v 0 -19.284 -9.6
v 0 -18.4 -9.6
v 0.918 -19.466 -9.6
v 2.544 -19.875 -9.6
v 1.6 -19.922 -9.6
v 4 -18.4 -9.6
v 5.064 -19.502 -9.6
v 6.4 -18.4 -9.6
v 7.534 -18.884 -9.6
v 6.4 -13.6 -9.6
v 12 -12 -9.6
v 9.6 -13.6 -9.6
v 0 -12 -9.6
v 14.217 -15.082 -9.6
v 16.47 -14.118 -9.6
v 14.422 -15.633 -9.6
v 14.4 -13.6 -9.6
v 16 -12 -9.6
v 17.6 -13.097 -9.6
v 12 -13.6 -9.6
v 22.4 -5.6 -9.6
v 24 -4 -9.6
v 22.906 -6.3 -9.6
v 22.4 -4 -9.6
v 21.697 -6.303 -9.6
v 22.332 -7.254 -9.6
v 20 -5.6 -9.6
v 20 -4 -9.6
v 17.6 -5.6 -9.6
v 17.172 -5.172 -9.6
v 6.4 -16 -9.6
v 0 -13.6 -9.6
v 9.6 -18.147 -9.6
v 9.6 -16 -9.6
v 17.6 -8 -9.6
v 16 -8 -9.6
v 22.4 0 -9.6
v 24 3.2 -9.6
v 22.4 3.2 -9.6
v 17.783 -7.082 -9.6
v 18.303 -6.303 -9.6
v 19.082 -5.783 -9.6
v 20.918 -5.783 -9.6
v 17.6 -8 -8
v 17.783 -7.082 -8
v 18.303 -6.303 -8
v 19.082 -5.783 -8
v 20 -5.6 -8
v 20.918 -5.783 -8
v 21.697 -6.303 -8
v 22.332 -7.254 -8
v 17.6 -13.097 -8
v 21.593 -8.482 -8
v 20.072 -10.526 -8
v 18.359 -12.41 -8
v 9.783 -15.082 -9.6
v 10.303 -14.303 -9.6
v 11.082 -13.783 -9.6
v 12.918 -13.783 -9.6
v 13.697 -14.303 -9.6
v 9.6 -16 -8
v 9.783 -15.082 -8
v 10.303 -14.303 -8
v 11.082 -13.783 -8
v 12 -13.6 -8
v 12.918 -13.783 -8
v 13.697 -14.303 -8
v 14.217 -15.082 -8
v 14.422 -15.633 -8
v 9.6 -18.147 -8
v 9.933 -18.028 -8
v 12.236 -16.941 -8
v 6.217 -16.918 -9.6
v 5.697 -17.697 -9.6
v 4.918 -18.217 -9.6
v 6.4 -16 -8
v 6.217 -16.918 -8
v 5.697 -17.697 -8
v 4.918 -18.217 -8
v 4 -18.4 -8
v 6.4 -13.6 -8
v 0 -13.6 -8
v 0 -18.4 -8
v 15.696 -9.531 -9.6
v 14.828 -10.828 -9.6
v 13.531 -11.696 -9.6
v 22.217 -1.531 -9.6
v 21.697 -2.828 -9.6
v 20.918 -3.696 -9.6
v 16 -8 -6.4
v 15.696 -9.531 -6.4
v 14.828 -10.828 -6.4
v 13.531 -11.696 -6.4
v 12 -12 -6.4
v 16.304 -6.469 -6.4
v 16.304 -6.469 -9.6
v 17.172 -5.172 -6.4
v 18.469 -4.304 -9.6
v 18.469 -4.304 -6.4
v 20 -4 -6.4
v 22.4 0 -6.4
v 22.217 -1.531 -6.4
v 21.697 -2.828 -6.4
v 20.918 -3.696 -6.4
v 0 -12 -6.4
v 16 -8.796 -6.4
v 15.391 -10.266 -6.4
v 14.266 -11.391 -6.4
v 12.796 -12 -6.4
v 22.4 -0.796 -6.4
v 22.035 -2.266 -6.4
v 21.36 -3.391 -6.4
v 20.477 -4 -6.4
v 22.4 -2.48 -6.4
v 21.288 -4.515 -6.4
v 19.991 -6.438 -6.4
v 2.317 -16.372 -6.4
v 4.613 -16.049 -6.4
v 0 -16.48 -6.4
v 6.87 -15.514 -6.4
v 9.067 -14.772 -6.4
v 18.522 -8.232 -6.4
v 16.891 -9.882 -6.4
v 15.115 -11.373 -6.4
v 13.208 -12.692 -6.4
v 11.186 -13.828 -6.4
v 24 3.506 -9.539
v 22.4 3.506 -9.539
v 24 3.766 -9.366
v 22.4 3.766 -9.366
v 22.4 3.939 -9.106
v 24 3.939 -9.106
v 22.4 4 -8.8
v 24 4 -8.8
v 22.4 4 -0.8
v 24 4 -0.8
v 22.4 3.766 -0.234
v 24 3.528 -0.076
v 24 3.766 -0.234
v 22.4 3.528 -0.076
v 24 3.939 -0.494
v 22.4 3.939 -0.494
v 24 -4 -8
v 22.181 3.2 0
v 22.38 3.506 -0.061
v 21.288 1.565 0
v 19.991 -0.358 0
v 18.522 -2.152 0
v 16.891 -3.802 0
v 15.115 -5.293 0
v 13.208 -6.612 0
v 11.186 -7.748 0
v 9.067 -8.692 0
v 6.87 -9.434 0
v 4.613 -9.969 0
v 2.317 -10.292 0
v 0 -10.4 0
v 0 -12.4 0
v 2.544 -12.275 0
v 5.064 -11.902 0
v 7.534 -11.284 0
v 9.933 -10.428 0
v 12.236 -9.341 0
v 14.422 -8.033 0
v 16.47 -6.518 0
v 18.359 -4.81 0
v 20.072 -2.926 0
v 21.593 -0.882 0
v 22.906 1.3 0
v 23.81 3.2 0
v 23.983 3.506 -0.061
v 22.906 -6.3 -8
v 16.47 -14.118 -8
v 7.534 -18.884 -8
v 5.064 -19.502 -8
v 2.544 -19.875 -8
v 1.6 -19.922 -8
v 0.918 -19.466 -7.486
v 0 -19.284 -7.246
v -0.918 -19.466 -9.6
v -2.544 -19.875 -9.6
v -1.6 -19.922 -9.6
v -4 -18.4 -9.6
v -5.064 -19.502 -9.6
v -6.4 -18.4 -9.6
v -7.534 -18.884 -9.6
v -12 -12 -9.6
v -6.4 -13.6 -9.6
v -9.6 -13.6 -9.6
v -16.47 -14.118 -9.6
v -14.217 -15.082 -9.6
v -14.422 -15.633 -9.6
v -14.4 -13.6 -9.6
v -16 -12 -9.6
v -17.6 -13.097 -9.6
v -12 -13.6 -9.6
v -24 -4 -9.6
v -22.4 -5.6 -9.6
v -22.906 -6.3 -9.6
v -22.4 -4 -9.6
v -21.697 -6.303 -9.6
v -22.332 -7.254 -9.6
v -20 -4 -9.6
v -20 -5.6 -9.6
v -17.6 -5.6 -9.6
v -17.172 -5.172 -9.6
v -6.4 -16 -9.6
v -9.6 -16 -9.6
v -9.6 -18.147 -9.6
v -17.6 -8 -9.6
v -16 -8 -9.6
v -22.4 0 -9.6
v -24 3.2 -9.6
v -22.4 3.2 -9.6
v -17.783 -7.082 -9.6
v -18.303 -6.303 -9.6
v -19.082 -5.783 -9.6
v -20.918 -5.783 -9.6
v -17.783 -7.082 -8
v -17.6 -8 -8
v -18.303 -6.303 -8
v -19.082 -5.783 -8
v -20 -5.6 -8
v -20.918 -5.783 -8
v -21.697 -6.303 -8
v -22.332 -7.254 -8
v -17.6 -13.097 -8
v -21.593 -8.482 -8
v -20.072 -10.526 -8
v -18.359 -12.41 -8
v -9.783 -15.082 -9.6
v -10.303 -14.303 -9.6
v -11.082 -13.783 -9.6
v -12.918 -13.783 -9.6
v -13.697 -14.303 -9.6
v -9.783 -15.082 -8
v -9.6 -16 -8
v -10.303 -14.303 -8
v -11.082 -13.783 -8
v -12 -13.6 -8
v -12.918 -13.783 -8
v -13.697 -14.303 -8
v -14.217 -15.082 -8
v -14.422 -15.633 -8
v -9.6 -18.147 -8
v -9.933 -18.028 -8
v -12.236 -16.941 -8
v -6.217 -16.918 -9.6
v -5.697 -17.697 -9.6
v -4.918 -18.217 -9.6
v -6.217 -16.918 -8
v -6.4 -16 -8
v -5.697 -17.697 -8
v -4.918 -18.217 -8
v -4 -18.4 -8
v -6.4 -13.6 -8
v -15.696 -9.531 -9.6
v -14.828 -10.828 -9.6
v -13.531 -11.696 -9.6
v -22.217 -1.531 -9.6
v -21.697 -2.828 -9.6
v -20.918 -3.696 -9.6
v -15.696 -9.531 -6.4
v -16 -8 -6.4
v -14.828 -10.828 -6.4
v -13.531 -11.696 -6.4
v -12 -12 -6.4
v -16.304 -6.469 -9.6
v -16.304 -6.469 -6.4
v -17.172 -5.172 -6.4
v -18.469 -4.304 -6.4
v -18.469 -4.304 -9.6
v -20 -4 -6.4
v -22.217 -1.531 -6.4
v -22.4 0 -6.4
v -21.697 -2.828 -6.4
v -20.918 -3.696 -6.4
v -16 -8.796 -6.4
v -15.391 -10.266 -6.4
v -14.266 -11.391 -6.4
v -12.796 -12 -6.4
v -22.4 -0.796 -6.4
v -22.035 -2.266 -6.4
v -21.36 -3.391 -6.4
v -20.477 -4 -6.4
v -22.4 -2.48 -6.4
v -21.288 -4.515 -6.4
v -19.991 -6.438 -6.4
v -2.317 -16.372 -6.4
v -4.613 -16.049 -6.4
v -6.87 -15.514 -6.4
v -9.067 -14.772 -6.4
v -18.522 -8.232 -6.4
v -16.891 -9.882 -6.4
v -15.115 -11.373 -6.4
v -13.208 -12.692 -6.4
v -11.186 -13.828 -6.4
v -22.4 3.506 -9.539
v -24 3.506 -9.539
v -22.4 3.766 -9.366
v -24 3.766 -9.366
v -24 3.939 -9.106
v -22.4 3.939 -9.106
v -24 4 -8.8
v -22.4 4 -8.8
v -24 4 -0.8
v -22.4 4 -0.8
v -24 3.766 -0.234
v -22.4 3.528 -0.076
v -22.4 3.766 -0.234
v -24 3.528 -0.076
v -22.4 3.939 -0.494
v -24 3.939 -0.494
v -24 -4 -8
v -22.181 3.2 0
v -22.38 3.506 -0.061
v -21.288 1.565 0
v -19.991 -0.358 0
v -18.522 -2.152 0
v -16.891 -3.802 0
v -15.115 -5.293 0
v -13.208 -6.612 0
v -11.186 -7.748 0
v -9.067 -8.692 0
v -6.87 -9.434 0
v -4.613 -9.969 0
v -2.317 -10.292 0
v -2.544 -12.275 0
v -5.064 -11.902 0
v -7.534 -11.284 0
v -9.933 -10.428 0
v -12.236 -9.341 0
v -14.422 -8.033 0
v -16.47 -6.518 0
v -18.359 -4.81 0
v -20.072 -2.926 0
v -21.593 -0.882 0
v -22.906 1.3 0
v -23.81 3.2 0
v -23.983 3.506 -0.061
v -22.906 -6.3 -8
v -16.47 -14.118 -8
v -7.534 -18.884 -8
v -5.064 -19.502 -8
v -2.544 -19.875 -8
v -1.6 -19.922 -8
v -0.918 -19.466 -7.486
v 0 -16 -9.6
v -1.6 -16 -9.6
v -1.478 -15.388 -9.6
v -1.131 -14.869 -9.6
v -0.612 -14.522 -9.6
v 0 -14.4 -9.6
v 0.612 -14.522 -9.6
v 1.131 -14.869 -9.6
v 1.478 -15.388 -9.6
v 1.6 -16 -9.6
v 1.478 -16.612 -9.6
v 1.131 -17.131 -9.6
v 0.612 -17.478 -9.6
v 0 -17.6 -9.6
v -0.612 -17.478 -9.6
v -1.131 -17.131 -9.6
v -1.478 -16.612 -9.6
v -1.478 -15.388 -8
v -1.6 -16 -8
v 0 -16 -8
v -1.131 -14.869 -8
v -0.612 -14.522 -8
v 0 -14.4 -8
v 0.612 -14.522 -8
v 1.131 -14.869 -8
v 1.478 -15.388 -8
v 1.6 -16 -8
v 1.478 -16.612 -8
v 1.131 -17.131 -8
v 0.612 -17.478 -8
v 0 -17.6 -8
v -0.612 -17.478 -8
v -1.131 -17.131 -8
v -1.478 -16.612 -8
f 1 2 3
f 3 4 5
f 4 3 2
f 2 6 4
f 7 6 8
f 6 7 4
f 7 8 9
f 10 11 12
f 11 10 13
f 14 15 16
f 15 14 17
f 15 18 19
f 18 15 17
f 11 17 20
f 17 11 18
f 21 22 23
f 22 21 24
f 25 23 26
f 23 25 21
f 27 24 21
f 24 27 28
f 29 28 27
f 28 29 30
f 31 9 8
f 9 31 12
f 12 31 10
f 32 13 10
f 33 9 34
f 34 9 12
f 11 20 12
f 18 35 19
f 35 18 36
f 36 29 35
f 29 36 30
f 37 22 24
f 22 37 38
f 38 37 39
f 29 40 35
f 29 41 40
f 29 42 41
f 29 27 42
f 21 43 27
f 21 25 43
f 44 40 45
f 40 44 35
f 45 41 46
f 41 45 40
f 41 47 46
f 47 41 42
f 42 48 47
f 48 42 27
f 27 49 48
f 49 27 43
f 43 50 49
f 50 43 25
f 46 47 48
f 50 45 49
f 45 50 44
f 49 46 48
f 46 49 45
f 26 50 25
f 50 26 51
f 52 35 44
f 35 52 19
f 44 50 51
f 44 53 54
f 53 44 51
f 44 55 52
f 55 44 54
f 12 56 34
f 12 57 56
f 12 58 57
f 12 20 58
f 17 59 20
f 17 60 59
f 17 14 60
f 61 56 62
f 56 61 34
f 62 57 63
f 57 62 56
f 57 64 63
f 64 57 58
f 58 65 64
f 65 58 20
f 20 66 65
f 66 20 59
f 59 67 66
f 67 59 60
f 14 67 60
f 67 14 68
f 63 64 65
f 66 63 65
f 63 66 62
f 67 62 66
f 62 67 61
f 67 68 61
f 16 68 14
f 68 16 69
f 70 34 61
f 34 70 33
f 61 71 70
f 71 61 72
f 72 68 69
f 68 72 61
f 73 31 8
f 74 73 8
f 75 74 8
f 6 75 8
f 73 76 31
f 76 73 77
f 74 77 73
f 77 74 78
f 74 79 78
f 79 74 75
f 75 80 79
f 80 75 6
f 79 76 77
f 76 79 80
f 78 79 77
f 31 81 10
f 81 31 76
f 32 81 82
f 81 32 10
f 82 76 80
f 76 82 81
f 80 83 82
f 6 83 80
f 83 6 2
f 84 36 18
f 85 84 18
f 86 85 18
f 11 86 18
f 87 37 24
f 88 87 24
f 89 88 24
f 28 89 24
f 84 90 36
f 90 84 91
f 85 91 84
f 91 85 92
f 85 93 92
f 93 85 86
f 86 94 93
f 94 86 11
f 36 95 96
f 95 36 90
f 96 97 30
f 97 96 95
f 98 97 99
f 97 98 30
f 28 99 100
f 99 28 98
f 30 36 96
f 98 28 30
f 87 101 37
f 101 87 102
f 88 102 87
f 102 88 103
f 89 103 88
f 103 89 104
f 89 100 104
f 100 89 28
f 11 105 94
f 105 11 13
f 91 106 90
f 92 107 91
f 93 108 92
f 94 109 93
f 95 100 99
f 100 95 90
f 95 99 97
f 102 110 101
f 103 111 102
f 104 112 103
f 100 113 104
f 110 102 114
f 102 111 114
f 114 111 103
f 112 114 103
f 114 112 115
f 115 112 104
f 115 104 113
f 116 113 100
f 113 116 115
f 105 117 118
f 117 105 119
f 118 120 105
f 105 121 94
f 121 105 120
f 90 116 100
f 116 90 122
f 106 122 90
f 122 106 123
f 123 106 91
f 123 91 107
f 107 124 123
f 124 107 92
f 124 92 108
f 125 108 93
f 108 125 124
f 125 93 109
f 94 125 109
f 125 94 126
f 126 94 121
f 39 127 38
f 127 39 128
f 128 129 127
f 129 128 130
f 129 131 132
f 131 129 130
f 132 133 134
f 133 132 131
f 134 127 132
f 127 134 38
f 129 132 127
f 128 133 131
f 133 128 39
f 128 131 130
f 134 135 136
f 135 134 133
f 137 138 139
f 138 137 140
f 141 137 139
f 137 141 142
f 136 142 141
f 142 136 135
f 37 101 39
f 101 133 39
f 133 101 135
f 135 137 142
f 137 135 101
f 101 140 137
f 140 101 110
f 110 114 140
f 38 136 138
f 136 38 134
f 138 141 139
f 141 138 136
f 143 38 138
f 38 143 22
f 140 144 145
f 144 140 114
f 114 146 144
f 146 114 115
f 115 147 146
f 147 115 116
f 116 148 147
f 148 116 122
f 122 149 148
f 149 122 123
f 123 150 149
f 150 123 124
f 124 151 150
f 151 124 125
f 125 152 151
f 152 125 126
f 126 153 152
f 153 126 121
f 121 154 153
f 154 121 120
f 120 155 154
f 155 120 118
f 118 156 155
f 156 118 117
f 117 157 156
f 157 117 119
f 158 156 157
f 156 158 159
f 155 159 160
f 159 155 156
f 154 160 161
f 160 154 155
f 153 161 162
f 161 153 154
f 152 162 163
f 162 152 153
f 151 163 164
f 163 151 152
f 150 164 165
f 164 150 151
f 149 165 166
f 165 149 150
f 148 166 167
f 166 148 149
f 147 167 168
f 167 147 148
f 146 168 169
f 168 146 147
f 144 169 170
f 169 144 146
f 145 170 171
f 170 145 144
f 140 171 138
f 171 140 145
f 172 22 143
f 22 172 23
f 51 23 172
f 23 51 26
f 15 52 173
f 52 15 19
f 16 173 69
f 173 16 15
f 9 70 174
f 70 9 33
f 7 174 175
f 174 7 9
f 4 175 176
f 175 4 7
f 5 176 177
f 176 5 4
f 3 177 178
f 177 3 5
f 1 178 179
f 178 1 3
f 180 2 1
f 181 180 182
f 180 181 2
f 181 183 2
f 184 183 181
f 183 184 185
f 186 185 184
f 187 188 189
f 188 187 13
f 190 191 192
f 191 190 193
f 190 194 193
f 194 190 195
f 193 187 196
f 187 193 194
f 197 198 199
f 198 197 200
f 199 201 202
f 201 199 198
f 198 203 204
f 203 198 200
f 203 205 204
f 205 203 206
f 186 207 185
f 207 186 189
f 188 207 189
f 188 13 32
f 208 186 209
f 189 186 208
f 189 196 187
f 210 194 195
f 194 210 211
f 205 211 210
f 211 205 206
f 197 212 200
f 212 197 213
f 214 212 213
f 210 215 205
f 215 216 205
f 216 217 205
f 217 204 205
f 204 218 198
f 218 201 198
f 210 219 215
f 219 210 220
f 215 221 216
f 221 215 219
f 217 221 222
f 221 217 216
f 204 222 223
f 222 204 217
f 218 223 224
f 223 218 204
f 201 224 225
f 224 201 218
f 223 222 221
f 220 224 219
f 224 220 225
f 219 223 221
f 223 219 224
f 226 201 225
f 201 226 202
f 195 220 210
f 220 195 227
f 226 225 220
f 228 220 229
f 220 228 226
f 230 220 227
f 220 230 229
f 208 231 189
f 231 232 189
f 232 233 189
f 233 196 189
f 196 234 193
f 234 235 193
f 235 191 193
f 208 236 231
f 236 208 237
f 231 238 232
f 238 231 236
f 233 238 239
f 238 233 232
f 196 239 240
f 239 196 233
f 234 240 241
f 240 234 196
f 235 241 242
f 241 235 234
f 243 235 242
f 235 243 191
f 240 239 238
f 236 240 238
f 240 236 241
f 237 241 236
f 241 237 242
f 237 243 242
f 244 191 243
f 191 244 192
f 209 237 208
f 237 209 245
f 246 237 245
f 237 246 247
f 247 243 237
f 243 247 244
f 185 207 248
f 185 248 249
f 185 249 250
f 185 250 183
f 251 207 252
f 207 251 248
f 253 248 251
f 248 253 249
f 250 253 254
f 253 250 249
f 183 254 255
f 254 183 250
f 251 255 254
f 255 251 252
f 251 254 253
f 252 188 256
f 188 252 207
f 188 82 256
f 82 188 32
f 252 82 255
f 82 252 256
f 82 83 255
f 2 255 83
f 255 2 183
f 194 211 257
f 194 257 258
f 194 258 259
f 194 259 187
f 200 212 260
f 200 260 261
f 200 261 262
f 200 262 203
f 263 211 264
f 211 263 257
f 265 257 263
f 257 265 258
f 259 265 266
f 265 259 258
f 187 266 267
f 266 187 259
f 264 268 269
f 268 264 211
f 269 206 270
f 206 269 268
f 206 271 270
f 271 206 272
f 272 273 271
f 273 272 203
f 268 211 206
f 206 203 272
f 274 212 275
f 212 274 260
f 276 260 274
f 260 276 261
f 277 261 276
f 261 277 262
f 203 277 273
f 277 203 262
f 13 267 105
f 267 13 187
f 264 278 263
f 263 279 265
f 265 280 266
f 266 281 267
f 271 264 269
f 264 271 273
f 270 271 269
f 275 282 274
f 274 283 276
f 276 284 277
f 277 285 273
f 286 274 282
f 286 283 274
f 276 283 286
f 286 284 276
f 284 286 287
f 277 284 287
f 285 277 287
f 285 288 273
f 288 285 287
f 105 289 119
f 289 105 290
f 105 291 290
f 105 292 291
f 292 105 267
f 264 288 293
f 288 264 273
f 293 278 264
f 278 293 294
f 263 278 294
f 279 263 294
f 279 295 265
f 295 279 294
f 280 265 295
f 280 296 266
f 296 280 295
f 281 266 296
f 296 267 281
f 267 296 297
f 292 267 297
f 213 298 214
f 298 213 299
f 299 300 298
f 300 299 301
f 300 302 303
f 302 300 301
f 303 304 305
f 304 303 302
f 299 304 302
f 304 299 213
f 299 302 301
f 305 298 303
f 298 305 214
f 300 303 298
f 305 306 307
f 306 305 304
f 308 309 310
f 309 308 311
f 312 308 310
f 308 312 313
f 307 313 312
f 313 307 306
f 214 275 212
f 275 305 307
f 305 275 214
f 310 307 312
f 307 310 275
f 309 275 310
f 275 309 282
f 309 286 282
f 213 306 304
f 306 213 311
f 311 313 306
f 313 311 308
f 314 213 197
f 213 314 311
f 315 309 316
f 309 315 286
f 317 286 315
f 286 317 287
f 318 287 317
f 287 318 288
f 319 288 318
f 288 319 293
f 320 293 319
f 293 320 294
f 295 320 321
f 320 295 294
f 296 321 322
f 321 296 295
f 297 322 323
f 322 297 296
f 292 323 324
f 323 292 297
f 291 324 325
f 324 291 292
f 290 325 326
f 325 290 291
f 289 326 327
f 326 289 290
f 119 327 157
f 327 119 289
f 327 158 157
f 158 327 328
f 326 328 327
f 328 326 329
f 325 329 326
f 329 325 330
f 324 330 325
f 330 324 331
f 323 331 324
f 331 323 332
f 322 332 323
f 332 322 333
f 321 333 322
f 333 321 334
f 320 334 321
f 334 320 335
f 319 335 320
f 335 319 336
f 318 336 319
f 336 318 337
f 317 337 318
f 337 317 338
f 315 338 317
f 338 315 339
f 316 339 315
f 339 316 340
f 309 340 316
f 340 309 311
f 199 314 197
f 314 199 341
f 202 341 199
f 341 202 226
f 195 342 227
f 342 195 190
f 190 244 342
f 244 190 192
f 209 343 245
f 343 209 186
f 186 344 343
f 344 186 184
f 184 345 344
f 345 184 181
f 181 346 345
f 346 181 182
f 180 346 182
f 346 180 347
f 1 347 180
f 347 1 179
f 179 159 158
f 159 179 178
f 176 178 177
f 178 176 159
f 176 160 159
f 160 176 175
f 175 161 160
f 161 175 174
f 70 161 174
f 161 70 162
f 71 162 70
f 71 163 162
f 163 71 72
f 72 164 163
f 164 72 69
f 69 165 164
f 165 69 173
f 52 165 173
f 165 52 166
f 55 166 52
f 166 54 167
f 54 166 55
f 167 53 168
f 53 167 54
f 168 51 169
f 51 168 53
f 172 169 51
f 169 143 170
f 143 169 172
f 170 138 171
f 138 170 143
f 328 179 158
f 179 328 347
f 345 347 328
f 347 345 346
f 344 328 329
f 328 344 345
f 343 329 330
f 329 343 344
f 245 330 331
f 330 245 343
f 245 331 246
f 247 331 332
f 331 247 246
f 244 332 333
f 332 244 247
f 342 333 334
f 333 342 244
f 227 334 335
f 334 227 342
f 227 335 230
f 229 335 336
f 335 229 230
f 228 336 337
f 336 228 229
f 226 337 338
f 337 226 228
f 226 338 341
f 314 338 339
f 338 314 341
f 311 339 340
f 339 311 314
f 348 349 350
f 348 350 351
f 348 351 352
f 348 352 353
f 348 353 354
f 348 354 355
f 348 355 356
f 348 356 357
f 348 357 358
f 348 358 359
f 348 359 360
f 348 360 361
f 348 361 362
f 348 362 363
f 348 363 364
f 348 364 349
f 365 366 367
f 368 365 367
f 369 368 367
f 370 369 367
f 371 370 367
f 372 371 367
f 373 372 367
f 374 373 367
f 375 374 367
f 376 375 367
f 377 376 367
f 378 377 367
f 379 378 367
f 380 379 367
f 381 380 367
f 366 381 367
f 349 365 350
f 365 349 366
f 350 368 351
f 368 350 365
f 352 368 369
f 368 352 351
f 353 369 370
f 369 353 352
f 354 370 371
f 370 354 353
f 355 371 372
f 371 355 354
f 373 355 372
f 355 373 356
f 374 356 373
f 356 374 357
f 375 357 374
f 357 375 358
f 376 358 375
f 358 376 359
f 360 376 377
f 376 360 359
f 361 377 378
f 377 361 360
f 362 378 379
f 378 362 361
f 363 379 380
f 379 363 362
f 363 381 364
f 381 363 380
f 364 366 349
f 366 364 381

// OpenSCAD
use <../lib.scad>
use <s/35299s01.scad>
use <s/62360s02.scad>
use <../p/stud3.scad>
function ldraw_lib__35299() = [
// 0 Windscreen  3 x  6 x  1 Curved with Bottom Rectangular Stud Holder
// 0 Name: 35299.dat
// 0 Author: Orion Pobursky [OrionP]
// 0 !LDRAW_ORG Part UPDATE 2023-02
// 0 !LICENSE Licensed under CC BY 4.0 : see CAreadme.txt
// 
// 0 BFC CERTIFY CCW
  [0,"BFC","CERTIFY"],
  [0,"BFC","CCW"],
// 
// 0 !KEYWORDS BrickLink 62360
// 
// 0 !HISTORY 2023-04-17 [OrionP] Official Update 2023-02
// 
// 
// 1 16 0 0 0 1 0 0 0 1 0 0 0 1 s\35299s01.dat
  [1,16,0,0,0,1,0,0,0,1,0,0,0,1, ldraw_lib__s__35299s01()],
// 1 16 0 0 0 -1 0 0 0 1 0 0 0 1 s\35299s01.dat
  [1,16,0,0,0,-1,0,0,0,1,0,0,0,1, ldraw_lib__s__35299s01()],
// 1 16 0 0 0 1 0 0 0 1 0 0 0 1 s\62360s02.dat
  [1,16,0,0,0,1,0,0,0,1,0,0,0,1, ldraw_lib__s__62360s02()],
// 1 16 0 0 0 -1 0 0 0 1 0 0 0 1 s\62360s02.dat
  [1,16,0,0,0,-1,0,0,0,1,0,0,0,1, ldraw_lib__s__62360s02()],
// 1 16 0 20 -40 -1 0 0 0 -1 0 0 0 1 stud3.dat
  [1,16,0,20,-40,-1,0,0,0,-1,0,0,0,1, ldraw_lib__stud3()],
];
module ldraw_lib__35299(step=0, col=false, unit=2/5, alt=false, line=0.2, solid=!$preview)
    makepoly(ldraw_lib__35299(), step=step, col=col, unit=unit, alt=alt, line=line, solid=solid);
ldraw_lib__35299(line=0.2);
